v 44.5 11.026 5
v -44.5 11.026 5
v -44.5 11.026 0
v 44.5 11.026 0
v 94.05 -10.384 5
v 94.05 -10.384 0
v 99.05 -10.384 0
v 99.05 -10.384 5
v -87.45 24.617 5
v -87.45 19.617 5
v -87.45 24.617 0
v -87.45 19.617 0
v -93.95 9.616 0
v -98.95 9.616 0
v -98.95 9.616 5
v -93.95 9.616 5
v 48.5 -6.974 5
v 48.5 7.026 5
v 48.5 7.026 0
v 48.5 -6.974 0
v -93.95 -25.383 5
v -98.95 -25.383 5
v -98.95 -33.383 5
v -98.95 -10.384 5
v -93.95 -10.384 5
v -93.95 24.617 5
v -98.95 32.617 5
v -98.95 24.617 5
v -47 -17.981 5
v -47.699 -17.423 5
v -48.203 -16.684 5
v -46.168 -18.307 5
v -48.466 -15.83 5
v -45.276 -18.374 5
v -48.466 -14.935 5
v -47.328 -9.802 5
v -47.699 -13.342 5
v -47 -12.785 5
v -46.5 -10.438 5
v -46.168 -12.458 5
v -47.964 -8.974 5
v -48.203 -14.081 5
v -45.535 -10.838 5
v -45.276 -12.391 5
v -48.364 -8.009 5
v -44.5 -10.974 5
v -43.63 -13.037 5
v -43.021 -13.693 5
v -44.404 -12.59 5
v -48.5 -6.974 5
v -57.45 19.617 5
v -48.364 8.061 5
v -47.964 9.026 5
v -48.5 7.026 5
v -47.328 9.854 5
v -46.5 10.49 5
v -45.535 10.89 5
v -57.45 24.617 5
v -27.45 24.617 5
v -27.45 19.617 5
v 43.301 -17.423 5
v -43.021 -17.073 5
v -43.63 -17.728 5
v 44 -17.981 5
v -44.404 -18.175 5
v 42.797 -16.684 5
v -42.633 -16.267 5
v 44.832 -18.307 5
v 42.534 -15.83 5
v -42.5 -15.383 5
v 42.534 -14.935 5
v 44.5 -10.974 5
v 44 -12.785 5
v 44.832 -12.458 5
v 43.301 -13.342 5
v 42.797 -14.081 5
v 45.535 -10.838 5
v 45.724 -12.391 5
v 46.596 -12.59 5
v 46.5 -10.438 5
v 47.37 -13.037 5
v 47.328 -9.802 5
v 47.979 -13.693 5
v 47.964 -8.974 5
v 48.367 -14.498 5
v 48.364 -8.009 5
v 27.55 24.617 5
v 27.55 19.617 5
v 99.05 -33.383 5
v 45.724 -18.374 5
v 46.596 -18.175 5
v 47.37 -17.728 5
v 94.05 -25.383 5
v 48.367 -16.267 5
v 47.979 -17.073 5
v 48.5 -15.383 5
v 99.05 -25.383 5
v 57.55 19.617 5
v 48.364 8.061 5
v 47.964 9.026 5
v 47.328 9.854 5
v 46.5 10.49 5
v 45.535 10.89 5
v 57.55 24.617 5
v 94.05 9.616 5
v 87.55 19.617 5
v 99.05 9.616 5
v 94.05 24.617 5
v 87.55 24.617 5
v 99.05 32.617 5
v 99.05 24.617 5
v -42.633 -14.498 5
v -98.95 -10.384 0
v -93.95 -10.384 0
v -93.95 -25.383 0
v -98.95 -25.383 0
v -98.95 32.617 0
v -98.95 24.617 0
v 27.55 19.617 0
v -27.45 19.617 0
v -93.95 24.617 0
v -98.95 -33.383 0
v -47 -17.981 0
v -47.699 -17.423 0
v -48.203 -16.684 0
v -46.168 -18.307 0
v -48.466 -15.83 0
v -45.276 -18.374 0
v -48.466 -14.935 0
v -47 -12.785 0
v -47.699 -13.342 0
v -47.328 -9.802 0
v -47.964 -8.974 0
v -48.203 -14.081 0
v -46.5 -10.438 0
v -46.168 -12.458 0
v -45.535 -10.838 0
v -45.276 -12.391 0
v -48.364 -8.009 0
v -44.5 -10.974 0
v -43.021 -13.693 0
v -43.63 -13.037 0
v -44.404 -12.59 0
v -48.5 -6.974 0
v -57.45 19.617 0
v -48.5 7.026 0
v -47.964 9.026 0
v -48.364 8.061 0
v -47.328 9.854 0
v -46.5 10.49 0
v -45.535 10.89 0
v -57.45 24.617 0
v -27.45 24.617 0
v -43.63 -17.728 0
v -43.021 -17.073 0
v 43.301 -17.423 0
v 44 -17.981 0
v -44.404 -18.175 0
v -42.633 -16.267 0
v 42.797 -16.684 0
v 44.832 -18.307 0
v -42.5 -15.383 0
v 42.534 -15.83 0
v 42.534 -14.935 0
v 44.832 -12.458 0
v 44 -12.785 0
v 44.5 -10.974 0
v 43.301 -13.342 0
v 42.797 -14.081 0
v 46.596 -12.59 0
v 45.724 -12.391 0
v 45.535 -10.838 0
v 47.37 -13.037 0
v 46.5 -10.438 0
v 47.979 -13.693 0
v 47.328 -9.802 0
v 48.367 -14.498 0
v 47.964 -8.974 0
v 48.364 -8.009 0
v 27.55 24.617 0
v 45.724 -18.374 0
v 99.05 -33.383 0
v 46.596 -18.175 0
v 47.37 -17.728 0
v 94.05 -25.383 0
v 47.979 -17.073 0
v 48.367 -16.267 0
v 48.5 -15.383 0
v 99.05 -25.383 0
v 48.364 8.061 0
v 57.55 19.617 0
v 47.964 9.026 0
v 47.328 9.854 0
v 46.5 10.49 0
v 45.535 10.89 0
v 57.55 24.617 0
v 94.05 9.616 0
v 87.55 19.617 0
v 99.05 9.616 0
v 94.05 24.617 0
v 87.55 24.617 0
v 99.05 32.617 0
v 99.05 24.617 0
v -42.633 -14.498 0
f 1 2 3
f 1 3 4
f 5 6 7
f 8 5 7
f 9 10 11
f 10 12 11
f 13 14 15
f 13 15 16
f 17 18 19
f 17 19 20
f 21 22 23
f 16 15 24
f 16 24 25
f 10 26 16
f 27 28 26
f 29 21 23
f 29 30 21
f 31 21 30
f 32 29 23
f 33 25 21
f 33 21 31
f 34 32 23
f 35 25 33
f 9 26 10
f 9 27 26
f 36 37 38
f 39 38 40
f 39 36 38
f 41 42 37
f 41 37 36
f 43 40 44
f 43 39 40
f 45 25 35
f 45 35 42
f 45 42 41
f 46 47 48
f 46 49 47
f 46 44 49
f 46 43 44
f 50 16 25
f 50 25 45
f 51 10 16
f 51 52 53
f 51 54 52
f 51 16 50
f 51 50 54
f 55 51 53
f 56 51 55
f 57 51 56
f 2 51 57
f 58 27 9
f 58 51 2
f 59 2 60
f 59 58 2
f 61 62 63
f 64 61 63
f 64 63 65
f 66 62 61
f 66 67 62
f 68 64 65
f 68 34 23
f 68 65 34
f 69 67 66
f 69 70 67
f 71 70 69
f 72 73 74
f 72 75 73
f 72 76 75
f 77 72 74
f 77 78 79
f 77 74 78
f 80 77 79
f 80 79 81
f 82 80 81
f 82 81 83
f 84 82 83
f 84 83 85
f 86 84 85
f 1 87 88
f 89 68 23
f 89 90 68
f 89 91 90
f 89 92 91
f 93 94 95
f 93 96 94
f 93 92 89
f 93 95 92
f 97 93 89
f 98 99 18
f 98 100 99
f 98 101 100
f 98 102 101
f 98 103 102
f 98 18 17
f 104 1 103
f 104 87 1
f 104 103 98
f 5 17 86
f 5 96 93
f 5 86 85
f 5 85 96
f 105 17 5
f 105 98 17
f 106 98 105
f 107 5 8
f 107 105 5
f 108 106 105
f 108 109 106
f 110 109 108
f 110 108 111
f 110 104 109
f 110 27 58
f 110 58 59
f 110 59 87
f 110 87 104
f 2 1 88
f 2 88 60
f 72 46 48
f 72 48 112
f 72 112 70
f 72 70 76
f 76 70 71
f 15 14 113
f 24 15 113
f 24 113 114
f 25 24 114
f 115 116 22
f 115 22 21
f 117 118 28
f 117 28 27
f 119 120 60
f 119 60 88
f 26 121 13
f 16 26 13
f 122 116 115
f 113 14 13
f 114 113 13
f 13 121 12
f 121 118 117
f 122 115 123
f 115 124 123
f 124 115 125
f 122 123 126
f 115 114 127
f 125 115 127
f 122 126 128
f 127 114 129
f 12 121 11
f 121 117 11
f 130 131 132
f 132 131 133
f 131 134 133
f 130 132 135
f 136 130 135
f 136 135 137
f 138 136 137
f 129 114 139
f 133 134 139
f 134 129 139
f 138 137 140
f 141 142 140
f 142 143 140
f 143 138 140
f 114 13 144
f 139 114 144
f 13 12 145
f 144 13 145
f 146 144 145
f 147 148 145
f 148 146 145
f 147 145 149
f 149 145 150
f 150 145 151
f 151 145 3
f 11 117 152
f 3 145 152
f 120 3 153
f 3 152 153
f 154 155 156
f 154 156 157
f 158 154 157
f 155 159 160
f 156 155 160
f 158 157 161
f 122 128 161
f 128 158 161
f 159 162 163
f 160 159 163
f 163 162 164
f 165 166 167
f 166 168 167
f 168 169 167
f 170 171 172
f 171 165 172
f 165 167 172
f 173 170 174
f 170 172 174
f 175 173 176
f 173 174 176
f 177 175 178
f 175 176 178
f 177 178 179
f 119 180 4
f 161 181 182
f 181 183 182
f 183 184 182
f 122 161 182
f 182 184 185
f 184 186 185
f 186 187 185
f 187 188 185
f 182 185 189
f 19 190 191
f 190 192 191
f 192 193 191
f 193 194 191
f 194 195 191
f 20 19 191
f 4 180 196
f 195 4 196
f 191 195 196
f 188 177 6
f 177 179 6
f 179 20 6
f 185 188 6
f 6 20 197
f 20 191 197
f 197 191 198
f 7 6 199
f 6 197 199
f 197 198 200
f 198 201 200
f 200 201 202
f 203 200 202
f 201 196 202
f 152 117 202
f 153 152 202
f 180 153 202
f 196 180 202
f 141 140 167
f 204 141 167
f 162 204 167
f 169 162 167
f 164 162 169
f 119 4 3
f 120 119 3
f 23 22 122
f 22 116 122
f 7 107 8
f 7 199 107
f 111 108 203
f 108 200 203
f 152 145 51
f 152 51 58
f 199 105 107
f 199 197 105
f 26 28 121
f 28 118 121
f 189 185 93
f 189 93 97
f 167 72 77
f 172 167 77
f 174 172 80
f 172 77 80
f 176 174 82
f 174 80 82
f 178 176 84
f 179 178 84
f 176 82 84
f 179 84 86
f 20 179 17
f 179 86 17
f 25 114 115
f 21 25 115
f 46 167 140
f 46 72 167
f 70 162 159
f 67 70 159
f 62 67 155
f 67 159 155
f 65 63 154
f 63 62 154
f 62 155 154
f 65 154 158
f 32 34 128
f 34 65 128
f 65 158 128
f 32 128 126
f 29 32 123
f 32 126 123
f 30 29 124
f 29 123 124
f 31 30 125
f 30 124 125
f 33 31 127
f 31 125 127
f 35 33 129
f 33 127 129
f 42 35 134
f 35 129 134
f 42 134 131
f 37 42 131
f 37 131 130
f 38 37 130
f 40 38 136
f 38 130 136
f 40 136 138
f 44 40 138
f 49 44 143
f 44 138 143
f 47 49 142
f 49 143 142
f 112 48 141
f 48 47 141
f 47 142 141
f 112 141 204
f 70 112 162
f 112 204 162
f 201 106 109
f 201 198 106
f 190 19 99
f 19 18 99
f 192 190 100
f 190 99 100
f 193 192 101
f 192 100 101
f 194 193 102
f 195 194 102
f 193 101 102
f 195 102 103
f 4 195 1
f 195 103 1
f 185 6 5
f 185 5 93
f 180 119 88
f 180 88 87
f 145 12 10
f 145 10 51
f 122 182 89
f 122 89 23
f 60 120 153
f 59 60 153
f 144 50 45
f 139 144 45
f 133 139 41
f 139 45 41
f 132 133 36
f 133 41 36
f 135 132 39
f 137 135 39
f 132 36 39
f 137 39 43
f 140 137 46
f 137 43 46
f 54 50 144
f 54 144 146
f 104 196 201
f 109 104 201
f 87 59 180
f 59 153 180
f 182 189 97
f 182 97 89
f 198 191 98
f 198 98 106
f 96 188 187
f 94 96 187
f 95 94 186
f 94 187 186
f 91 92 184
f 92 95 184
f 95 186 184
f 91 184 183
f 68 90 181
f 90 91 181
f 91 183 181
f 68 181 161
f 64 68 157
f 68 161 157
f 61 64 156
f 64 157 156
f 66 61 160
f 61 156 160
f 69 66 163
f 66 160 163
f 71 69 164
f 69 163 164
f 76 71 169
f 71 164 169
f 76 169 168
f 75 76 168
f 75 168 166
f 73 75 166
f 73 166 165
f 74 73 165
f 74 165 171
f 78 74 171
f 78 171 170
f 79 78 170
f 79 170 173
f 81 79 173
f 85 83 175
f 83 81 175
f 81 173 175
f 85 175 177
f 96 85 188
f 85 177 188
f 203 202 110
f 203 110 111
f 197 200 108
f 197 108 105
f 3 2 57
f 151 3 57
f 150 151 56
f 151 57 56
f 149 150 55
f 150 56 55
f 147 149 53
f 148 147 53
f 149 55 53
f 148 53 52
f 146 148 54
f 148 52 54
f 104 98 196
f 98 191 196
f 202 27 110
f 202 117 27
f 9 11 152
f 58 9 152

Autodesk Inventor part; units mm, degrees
ref_plane "YZ Plane" through (0, 0, 0) normal (1, 0, 0) x (0, 1, 0)
ref_plane "XZ Plane" through (0, 0, 0) normal (0, 1, 0) x (-1, 0, 0)
ref_plane "XY Plane" through (0, 0, 0) normal (0, 0, 1) x (1, 0, 0)
sketch "Sketch1" plane through (0, 0, 0) normal (0, 0, 1) x (1, 0, 0)
  circle A0 centre (45.5, -15.3826) radius 3
  circle A1 centre (-45.5, -15.3826) radius 3
  line L0 (44.6636, 0.7689) -> (35.6636, 0.7689)
  line L1 (33.6636, 2.7689) -> (33.6636, 5.2689)
  line L2 (46.6636, 5.2689) -> (46.6636, 2.7689)
  line L3 (29.9455, -2.1666) -> (-2.0545, -2.1666)
  line L4 (-4.0545, -0.1666) -> (-4.0545, 2.8334)
  line L5 (31.9455, 2.8334) -> (31.9455, -0.1666)
  circle A2 centre (89.024, -15.4039) radius 1.5
  circle A3 centre (65.024, -15.4039) radius 1.5
  circle A4 centre (89.024, 8.5961) radius 1.5
  circle A5 centre (65.024, 8.5961) radius 1.5
  arc A6 (67.8322, 7.6809) -> (67.8322, -14.4886) centre (77.024, -3.4039) ccw
  line L6 (69.3366, 7.4111) -> (71.8641, 3.0334)
  arc A7 (71.8641, 3.0334) -> (71.8641, -9.8411) centre (77.024, -3.4039) ccw
  line L7 (71.8641, -9.8411) -> (69.3366, -14.2188)
  arc A8 (67.8322, -14.4886) -> (69.3366, -14.2188) centre (68.4705, -13.7188) ccw
  arc A9 (69.3366, 7.4111) -> (67.8322, 7.6809) centre (68.4705, 6.9111) ccw
  arc A10 (91.2195, -0.986) -> (72.0202, 10.0988) centre (77.024, -3.4039) ccw
  arc A11 (72.0202, 10.0988) -> (71.5016, 8.6611) centre (72.3677, 9.1611) ccw
  line L8 (74.0291, 4.2834) -> (71.5016, 8.6611)
  arc A12 (85.1787, -2.1539) -> (74.0291, 4.2834) centre (77.024, -3.4039) ccw
  line L9 (90.2337, -2.1539) -> (85.1787, -2.1539)
  arc A13 (90.2337, -2.1539) -> (91.2195, -0.986) centre (90.2337, -1.1539) ccw
  line L10 (85.1787, -4.6539) -> (90.2337, -4.6539)
  arc A14 (91.2195, -5.8218) -> (90.2337, -4.6539) centre (90.2337, -5.6539) ccw
  arc A15 (72.0202, -16.9065) -> (91.2195, -5.8218) centre (77.024, -3.4039) ccw
  arc A16 (71.5016, -15.4688) -> (72.0202, -16.9065) centre (72.3677, -15.9688) ccw
  line L11 (71.5016, -15.4688) -> (74.0291, -11.0911)
  arc A17 (74.0291, -11.0911) -> (85.1787, -4.6539) centre (77.024, -3.4039) ccw
  circle A18 centre (-64.8953, -15.374) radius 1.5
  circle A19 centre (-88.8953, -15.374) radius 1.5
  circle A20 centre (-88.8953, 8.626) radius 1.5
  circle A21 centre (-64.8953, 8.626) radius 1.5
  arc A22 (-62.6997, -0.956) -> (-81.8991, 10.1287) centre (-76.8953, -3.374) ccw
  arc A23 (-81.8991, 10.1287) -> (-82.4176, 8.691) centre (-81.5516, 9.191) ccw
  line L12 (-79.8901, 4.3133) -> (-82.4176, 8.691)
  line L13 (-84.5827, 7.441) -> (-82.0552, 3.0633)
  arc A24 (-84.5827, 7.441) -> (-86.087, 7.7108) centre (-85.4487, 6.941) ccw
  arc A25 (-86.087, 7.7108) -> (-86.087, -14.4587) centre (-76.8953, -3.374) ccw
  arc A26 (-82.0552, 3.0633) -> (-82.0552, -9.8112) centre (-76.8953, -3.374) ccw
  arc A27 (-68.7405, -2.124) -> (-79.8901, 4.3133) centre (-76.8953, -3.374) ccw
  line L14 (-63.6855, -2.124) -> (-68.7405, -2.124)
  arc A28 (-63.6855, -2.124) -> (-62.6997, -0.956) centre (-63.6855, -1.124) ccw
  line L15 (-68.7405, -4.624) -> (-63.6855, -4.624)
  arc A29 (-62.6997, -5.7919) -> (-63.6855, -4.624) centre (-63.6855, -5.624) ccw
  arc A30 (-81.8991, -16.8766) -> (-62.6997, -5.7919) centre (-76.8953, -3.374) ccw
  arc A31 (-79.8901, -11.0612) -> (-68.7405, -4.624) centre (-76.8953, -3.374) ccw
  line L16 (-82.4176, -15.4389) -> (-79.8901, -11.0612)
  arc A32 (-82.4176, -15.4389) -> (-81.8991, -16.8766) centre (-81.5516, -15.9389) ccw
  line L17 (-82.0552, -9.8112) -> (-84.5827, -14.1889)
  arc A33 (-86.087, -14.4587) -> (-84.5827, -14.1889) centre (-85.4487, -13.6889) ccw
  line L18 (-2.0545, 4.8334) -> (29.9455, 4.8334)
  line L19 (35.6636, 7.2689) -> (44.6636, 7.2689)
  arc A34 (-4.0545, -0.1666) -> (-2.0545, -2.1666) centre (-2.0545, -0.1666) ccw
  arc A35 (-2.0545, 4.8334) -> (-4.0545, 2.8334) centre (-2.0545, 2.8334) ccw
  arc A36 (31.9455, 2.8334) -> (29.9455, 4.8334) centre (29.9455, 2.8334) ccw
  arc A37 (29.9455, -2.1666) -> (31.9455, -0.1666) centre (29.9455, -0.1666) ccw
  arc A38 (33.6636, 2.7689) -> (35.6636, 0.7689) centre (35.6636, 2.7689) ccw
  arc A39 (35.6636, 7.2689) -> (33.6636, 5.2689) centre (35.6636, 5.2689) ccw
  arc A40 (46.6636, 5.2689) -> (44.6636, 7.2689) centre (44.6636, 5.2689) ccw
  arc A41 (44.6636, 0.7689) -> (46.6636, 2.7689) centre (44.6636, 2.7689) ccw
  line L20 (-87.4504, 24.6174) -> (-57.4504, 24.6174)
  line L21 (-87.4504, 19.6174) -> (-87.4504, 24.6174)
  line L22 (-87.4504, 19.6174) -> (-57.4504, 19.6174)
  line L23 (-57.4504, 19.6174) -> (-57.4504, 24.6174)
  line L24 (-27.4504, 19.6174) -> (27.5496, 19.6174)
  line L25 (27.5496, 19.6174) -> (27.5496, 24.6174)
  line L26 (-27.4504, 24.6174) -> (27.5496, 24.6174)
  line L27 (-27.4504, 19.6174) -> (-27.4504, 24.6174)
  line L28 (57.5496, 19.6174) -> (87.5496, 19.6174)
  line L29 (87.5496, 19.6174) -> (87.5496, 24.6174)
  line L30 (57.5496, 24.6174) -> (87.5496, 24.6174)
  line L31 (57.5496, 19.6174) -> (57.5496, 24.6174)
  line L32 (-98.9504, -25.3833) -> (-98.9504, -33.3826)
  line L33 (99.0496, -33.3826) -> (-98.9504, -33.3826)
  line L34 (-98.9504, 24.6174) -> (-93.9504, 24.6174)
  line L35 (-93.9504, 24.6174) -> (-93.9504, 9.6159)
  line L36 (-98.9504, 9.6159) -> (-93.9504, 9.6159)
  line L37 (-98.9504, 9.6159) -> (-98.9504, -10.3841)
  line L38 (-98.9504, -10.3841) -> (-93.9504, -10.3841)
  line L39 (-93.9504, -10.3841) -> (-93.9504, -25.3833)
  line L40 (-98.9504, -25.3833) -> (-93.9504, -25.3833)
  line L41 (99.0496, -25.3833) -> (99.0496, -33.3833)
  line L42 (94.0496, -25.3833) -> (99.0496, -25.3833)
  line L43 (94.0496, -10.3841) -> (94.0496, -25.3833)
  line L44 (94.0496, -10.3841) -> (99.0496, -10.3841)
  line L45 (99.0496, 9.6159) -> (99.0496, -10.3841)
  line L46 (94.0496, 9.6159) -> (99.0496, 9.6159)
  line L47 (94.0496, 24.6174) -> (94.0496, 9.6159)
  line L48 (94.0496, 24.6174) -> (99.0496, 24.6174)
  line L49 (-98.9504, 24.6174) -> (-98.9504, 32.6174)
  line L50 (-98.9504, 32.6174) -> (99.0496, 32.6174)
  line L51 (99.0496, 32.6174) -> (99.0496, 24.6174)
  line L52 (-22.6436, -2.2792) -> (-22.6436, -8.2792)
  line L53 (-35.6436, -0.2792) -> (-24.6436, -0.2792)
  line L54 (-24.6436, -10.2792) -> (-35.6436, -10.2792)
  line L55 (-37.6436, -8.2792) -> (-37.6436, -2.2792)
  arc A42 (-35.6436, -0.2792) -> (-37.6436, -2.2792) centre (-35.6436, -2.2792) ccw
  arc A43 (-22.6436, -2.2792) -> (-24.6436, -0.2792) centre (-24.6436, -2.2792) ccw
  arc A44 (-24.6436, -10.2792) -> (-22.6436, -8.2792) centre (-24.6436, -8.2792) ccw
  arc A45 (-37.6436, -8.2792) -> (-35.6436, -10.2792) centre (-35.6436, -8.2792) ccw
  line L56 (-5.5869, 3.8805) -> (-5.5869, -1.877)
  line L57 (-7.5869, -3.877) -> (-13.5192, -3.877)
  line L58 (-15.5192, -1.877) -> (-15.5192, 3.8805)
  line L59 (-13.5192, 5.8805) -> (-7.5869, 5.8805)
  arc A46 (-13.5192, 5.8805) -> (-15.5192, 3.8805) centre (-13.5192, 3.8805) ccw
  arc A47 (-15.5192, -1.877) -> (-13.5192, -3.877) centre (-13.5192, -1.877) ccw
  arc A48 (-5.5869, 3.8805) -> (-7.5869, 5.8805) centre (-7.5869, 3.8805) ccw
  arc A49 (-7.5869, -3.877) -> (-5.5869, -1.877) centre (-7.5869, -1.877) ccw
  point P0 (-90.9348, -30.6649)
  point P1 (27.5, 24.6174)
  point P2 (0, 0)
  point P3 (-22.6436, -0.2792)
  point P4 (-22.6436, -10.2792)
  point P5 (-37.6436, -0.2792)
  point P6 (-37.6436, -10.2792)
  point P7 (-2.0545, 2.8334)
  dimension "d22" = 91
  dimension "d27" = 7
  dimension "d28" = 36
  dimension "d29" = 13
  dimension "d30" = 6.5
  dimension "d35" = 18
  dimension "d36" = 18
  dimension "d37" = 66
  dimension "d38" = 45.5
  dimension "d39" = 6
  dimension "d40" = 6
  dimension "d41" = 198
extrude "Extrusion1" add sketch "Sketch1" along normal blind 5
sketch "Sketch2" plane through (0, 0, 5) normal (0, 0, 1) x (1, 0, 0)
  line L0 (-44.5, 11.026) -> (44.5, 11.026)
  line L1 (48.5, 7.026) -> (48.5, -6.974)
  line L2 (44.5, -10.974) -> (-44.5, -10.974)
  line L3 (-48.5, -6.974) -> (-48.5, 7.026)
  arc A0 (-44.5, 11.026) -> (-48.5, 7.026) centre (-44.5, 7.026) ccw
  arc A1 (48.5, 7.026) -> (44.5, 11.026) centre (44.5, 7.026) ccw
  arc A2 (44.5, -10.974) -> (48.5, -6.974) centre (44.5, -6.974) ccw
  arc A3 (-48.5, -6.974) -> (-44.5, -10.974) centre (-44.5, -6.974) ccw
  line L4 (99.0496, -10.3841) -> (99.0496, 9.6159) projected
  line L5 (-98.9504, -33.3826) -> (99.0496, -33.3826) projected
  circle A4 centre (-45.5, -15.3826) radius 3 projected
  circle A5 centre (45.5, -15.3826) radius 3 projected
  arc A6 (-62.6997, -0.956) -> (-81.8991, 10.1287) centre (-76.8953, -3.374) ccw projected
  point P0 (0, 0)
  point P1 (-76.8953, -3.374)
  dimension "d48" = 4
  dimension "d58" = 97
  dimension "d59" = 22
  dimension "d60" = 50.5496
  dimension "d61" = 22.4087
extrude "Extrusion2" cut sketch "Sketch2" against normal up to next contours L0 A1 L1 A2 L2 A3 L3 A0
sketch "Sketch3" plane through (0, 0, 5) normal (0, 0, 1) x (1, 0, 0)
  line L0 (-92.421, 12.1859) -> (-62.2986, 12.1859)
  line L1 (-62.2986, 12.1859) -> (-62.2986, -19.0319)
  line L2 (-62.2986, -19.0319) -> (-92.421, -19.0319)
  line L3 (-92.421, -19.0319) -> (-92.421, 12.1859)
  line L4 (-92.421, 12.1859) -> (-62.2986, -19.0319) construction
  line L5 (-62.2986, 12.1859) -> (-92.421, -19.0319) construction
  line L6 (62.2986, 11.0377) -> (92.6949, 11.0377)
  line L7 (92.6949, 11.0377) -> (92.6949, -17.8837)
  line L8 (92.6949, -17.8837) -> (62.2986, -17.8837)
  line L9 (62.2986, -17.8837) -> (62.2986, 11.0377)
  line L10 (62.2986, 11.0377) -> (92.6949, -17.8837) construction
  line L11 (92.6949, 11.0377) -> (62.2986, -17.8837) construction
  point P0 (0, 0)
  point P1 (-77.3598, -3.423)
  point P2 (77.4968, -3.423)
extrude "Extrusion3" add sketch "Sketch3" against normal blind 5
sketch "Sketch4" plane through (0, 0, 5) normal (0, 0, 1) x (1, 0, 0)
  arc A0 (44.5, -10.974) -> (48.5, -6.974) centre (44.5, -6.974) ccw
  line L0 (44.5, -10.974) -> (-44.5, -10.974)
  arc A1 (-48.5, -6.974) -> (-44.5, -10.974) centre (-44.5, -6.974) ccw
  line L1 (-48.5, -6.974) -> (-48.5, 7.026)
  arc A2 (-44.5, 11.026) -> (-48.5, 7.026) centre (-44.5, 7.026) ccw
  line L2 (-44.5, 11.026) -> (44.5, 11.026)
  arc A3 (48.5, 7.026) -> (44.5, 11.026) centre (44.5, 7.026) ccw
  line L3 (48.5, 7.026) -> (48.5, -6.974)
  line L4 (-98.9504, -33.3826) -> (99.0496, -33.3826)
  line L5 (99.0496, -33.3826) -> (99.0496, -25.3833)
  line L6 (99.0496, -25.3833) -> (94.0496, -25.3833)
  line L7 (94.0496, -25.3833) -> (94.0496, -10.3841)
  line L8 (94.0496, -10.3841) -> (99.0496, -10.3841)
  line L9 (99.0496, -10.3841) -> (99.0496, 9.6159)
  line L10 (99.0496, 9.6159) -> (94.0496, 9.6159)
  line L11 (94.0496, 9.6159) -> (94.0496, 24.6174)
  line L12 (94.0496, 24.6174) -> (99.0496, 24.6174)
  line L13 (99.0496, 24.6174) -> (99.0496, 32.6174)
  line L14 (99.0496, 32.6174) -> (-98.9504, 32.6174)
  line L15 (-98.9504, 32.6174) -> (-98.9504, 24.6174)
  line L16 (-98.9504, 24.6174) -> (-93.9504, 24.6174)
  line L17 (-93.9504, 24.6174) -> (-93.9504, 9.6159)
  line L18 (-93.9504, 9.6159) -> (-98.9504, 9.6159)
  line L19 (-98.9504, 9.6159) -> (-98.9504, -10.3841)
  line L20 (-98.9504, -10.3841) -> (-93.9504, -10.3841)
  line L21 (-93.9504, -10.3841) -> (-93.9504, -25.3833)
  line L22 (-93.9504, -25.3833) -> (-98.9504, -25.3833)
  line L23 (-98.9504, -25.3833) -> (-98.9504, -33.3826)
  circle A4 centre (45.5, -15.3826) radius 3
  circle A5 centre (-45.5, -15.3826) radius 3
  line L24 (57.5496, 24.6174) -> (87.5496, 24.6174)
  line L25 (87.5496, 24.6174) -> (87.5496, 19.6174)
  line L26 (87.5496, 19.6174) -> (57.5496, 19.6174)
  line L27 (57.5496, 19.6174) -> (57.5496, 24.6174)
  line L28 (-27.4504, 24.6174) -> (27.5496, 24.6174)
  line L29 (27.5496, 24.6174) -> (27.5496, 19.6174)
  line L30 (27.5496, 19.6174) -> (-27.4504, 19.6174)
  line L31 (-27.4504, 19.6174) -> (-27.4504, 24.6174)
  line L32 (-87.4504, 19.6174) -> (-87.4504, 24.6174)
  line L33 (-87.4504, 24.6174) -> (-57.4504, 24.6174)
  line L34 (-57.4504, 24.6174) -> (-57.4504, 19.6174)
  line L35 (-57.4504, 19.6174) -> (-87.4504, 19.6174)
  point P0 (0, 0)
properties part number "case bottom back" material "Titanium"
